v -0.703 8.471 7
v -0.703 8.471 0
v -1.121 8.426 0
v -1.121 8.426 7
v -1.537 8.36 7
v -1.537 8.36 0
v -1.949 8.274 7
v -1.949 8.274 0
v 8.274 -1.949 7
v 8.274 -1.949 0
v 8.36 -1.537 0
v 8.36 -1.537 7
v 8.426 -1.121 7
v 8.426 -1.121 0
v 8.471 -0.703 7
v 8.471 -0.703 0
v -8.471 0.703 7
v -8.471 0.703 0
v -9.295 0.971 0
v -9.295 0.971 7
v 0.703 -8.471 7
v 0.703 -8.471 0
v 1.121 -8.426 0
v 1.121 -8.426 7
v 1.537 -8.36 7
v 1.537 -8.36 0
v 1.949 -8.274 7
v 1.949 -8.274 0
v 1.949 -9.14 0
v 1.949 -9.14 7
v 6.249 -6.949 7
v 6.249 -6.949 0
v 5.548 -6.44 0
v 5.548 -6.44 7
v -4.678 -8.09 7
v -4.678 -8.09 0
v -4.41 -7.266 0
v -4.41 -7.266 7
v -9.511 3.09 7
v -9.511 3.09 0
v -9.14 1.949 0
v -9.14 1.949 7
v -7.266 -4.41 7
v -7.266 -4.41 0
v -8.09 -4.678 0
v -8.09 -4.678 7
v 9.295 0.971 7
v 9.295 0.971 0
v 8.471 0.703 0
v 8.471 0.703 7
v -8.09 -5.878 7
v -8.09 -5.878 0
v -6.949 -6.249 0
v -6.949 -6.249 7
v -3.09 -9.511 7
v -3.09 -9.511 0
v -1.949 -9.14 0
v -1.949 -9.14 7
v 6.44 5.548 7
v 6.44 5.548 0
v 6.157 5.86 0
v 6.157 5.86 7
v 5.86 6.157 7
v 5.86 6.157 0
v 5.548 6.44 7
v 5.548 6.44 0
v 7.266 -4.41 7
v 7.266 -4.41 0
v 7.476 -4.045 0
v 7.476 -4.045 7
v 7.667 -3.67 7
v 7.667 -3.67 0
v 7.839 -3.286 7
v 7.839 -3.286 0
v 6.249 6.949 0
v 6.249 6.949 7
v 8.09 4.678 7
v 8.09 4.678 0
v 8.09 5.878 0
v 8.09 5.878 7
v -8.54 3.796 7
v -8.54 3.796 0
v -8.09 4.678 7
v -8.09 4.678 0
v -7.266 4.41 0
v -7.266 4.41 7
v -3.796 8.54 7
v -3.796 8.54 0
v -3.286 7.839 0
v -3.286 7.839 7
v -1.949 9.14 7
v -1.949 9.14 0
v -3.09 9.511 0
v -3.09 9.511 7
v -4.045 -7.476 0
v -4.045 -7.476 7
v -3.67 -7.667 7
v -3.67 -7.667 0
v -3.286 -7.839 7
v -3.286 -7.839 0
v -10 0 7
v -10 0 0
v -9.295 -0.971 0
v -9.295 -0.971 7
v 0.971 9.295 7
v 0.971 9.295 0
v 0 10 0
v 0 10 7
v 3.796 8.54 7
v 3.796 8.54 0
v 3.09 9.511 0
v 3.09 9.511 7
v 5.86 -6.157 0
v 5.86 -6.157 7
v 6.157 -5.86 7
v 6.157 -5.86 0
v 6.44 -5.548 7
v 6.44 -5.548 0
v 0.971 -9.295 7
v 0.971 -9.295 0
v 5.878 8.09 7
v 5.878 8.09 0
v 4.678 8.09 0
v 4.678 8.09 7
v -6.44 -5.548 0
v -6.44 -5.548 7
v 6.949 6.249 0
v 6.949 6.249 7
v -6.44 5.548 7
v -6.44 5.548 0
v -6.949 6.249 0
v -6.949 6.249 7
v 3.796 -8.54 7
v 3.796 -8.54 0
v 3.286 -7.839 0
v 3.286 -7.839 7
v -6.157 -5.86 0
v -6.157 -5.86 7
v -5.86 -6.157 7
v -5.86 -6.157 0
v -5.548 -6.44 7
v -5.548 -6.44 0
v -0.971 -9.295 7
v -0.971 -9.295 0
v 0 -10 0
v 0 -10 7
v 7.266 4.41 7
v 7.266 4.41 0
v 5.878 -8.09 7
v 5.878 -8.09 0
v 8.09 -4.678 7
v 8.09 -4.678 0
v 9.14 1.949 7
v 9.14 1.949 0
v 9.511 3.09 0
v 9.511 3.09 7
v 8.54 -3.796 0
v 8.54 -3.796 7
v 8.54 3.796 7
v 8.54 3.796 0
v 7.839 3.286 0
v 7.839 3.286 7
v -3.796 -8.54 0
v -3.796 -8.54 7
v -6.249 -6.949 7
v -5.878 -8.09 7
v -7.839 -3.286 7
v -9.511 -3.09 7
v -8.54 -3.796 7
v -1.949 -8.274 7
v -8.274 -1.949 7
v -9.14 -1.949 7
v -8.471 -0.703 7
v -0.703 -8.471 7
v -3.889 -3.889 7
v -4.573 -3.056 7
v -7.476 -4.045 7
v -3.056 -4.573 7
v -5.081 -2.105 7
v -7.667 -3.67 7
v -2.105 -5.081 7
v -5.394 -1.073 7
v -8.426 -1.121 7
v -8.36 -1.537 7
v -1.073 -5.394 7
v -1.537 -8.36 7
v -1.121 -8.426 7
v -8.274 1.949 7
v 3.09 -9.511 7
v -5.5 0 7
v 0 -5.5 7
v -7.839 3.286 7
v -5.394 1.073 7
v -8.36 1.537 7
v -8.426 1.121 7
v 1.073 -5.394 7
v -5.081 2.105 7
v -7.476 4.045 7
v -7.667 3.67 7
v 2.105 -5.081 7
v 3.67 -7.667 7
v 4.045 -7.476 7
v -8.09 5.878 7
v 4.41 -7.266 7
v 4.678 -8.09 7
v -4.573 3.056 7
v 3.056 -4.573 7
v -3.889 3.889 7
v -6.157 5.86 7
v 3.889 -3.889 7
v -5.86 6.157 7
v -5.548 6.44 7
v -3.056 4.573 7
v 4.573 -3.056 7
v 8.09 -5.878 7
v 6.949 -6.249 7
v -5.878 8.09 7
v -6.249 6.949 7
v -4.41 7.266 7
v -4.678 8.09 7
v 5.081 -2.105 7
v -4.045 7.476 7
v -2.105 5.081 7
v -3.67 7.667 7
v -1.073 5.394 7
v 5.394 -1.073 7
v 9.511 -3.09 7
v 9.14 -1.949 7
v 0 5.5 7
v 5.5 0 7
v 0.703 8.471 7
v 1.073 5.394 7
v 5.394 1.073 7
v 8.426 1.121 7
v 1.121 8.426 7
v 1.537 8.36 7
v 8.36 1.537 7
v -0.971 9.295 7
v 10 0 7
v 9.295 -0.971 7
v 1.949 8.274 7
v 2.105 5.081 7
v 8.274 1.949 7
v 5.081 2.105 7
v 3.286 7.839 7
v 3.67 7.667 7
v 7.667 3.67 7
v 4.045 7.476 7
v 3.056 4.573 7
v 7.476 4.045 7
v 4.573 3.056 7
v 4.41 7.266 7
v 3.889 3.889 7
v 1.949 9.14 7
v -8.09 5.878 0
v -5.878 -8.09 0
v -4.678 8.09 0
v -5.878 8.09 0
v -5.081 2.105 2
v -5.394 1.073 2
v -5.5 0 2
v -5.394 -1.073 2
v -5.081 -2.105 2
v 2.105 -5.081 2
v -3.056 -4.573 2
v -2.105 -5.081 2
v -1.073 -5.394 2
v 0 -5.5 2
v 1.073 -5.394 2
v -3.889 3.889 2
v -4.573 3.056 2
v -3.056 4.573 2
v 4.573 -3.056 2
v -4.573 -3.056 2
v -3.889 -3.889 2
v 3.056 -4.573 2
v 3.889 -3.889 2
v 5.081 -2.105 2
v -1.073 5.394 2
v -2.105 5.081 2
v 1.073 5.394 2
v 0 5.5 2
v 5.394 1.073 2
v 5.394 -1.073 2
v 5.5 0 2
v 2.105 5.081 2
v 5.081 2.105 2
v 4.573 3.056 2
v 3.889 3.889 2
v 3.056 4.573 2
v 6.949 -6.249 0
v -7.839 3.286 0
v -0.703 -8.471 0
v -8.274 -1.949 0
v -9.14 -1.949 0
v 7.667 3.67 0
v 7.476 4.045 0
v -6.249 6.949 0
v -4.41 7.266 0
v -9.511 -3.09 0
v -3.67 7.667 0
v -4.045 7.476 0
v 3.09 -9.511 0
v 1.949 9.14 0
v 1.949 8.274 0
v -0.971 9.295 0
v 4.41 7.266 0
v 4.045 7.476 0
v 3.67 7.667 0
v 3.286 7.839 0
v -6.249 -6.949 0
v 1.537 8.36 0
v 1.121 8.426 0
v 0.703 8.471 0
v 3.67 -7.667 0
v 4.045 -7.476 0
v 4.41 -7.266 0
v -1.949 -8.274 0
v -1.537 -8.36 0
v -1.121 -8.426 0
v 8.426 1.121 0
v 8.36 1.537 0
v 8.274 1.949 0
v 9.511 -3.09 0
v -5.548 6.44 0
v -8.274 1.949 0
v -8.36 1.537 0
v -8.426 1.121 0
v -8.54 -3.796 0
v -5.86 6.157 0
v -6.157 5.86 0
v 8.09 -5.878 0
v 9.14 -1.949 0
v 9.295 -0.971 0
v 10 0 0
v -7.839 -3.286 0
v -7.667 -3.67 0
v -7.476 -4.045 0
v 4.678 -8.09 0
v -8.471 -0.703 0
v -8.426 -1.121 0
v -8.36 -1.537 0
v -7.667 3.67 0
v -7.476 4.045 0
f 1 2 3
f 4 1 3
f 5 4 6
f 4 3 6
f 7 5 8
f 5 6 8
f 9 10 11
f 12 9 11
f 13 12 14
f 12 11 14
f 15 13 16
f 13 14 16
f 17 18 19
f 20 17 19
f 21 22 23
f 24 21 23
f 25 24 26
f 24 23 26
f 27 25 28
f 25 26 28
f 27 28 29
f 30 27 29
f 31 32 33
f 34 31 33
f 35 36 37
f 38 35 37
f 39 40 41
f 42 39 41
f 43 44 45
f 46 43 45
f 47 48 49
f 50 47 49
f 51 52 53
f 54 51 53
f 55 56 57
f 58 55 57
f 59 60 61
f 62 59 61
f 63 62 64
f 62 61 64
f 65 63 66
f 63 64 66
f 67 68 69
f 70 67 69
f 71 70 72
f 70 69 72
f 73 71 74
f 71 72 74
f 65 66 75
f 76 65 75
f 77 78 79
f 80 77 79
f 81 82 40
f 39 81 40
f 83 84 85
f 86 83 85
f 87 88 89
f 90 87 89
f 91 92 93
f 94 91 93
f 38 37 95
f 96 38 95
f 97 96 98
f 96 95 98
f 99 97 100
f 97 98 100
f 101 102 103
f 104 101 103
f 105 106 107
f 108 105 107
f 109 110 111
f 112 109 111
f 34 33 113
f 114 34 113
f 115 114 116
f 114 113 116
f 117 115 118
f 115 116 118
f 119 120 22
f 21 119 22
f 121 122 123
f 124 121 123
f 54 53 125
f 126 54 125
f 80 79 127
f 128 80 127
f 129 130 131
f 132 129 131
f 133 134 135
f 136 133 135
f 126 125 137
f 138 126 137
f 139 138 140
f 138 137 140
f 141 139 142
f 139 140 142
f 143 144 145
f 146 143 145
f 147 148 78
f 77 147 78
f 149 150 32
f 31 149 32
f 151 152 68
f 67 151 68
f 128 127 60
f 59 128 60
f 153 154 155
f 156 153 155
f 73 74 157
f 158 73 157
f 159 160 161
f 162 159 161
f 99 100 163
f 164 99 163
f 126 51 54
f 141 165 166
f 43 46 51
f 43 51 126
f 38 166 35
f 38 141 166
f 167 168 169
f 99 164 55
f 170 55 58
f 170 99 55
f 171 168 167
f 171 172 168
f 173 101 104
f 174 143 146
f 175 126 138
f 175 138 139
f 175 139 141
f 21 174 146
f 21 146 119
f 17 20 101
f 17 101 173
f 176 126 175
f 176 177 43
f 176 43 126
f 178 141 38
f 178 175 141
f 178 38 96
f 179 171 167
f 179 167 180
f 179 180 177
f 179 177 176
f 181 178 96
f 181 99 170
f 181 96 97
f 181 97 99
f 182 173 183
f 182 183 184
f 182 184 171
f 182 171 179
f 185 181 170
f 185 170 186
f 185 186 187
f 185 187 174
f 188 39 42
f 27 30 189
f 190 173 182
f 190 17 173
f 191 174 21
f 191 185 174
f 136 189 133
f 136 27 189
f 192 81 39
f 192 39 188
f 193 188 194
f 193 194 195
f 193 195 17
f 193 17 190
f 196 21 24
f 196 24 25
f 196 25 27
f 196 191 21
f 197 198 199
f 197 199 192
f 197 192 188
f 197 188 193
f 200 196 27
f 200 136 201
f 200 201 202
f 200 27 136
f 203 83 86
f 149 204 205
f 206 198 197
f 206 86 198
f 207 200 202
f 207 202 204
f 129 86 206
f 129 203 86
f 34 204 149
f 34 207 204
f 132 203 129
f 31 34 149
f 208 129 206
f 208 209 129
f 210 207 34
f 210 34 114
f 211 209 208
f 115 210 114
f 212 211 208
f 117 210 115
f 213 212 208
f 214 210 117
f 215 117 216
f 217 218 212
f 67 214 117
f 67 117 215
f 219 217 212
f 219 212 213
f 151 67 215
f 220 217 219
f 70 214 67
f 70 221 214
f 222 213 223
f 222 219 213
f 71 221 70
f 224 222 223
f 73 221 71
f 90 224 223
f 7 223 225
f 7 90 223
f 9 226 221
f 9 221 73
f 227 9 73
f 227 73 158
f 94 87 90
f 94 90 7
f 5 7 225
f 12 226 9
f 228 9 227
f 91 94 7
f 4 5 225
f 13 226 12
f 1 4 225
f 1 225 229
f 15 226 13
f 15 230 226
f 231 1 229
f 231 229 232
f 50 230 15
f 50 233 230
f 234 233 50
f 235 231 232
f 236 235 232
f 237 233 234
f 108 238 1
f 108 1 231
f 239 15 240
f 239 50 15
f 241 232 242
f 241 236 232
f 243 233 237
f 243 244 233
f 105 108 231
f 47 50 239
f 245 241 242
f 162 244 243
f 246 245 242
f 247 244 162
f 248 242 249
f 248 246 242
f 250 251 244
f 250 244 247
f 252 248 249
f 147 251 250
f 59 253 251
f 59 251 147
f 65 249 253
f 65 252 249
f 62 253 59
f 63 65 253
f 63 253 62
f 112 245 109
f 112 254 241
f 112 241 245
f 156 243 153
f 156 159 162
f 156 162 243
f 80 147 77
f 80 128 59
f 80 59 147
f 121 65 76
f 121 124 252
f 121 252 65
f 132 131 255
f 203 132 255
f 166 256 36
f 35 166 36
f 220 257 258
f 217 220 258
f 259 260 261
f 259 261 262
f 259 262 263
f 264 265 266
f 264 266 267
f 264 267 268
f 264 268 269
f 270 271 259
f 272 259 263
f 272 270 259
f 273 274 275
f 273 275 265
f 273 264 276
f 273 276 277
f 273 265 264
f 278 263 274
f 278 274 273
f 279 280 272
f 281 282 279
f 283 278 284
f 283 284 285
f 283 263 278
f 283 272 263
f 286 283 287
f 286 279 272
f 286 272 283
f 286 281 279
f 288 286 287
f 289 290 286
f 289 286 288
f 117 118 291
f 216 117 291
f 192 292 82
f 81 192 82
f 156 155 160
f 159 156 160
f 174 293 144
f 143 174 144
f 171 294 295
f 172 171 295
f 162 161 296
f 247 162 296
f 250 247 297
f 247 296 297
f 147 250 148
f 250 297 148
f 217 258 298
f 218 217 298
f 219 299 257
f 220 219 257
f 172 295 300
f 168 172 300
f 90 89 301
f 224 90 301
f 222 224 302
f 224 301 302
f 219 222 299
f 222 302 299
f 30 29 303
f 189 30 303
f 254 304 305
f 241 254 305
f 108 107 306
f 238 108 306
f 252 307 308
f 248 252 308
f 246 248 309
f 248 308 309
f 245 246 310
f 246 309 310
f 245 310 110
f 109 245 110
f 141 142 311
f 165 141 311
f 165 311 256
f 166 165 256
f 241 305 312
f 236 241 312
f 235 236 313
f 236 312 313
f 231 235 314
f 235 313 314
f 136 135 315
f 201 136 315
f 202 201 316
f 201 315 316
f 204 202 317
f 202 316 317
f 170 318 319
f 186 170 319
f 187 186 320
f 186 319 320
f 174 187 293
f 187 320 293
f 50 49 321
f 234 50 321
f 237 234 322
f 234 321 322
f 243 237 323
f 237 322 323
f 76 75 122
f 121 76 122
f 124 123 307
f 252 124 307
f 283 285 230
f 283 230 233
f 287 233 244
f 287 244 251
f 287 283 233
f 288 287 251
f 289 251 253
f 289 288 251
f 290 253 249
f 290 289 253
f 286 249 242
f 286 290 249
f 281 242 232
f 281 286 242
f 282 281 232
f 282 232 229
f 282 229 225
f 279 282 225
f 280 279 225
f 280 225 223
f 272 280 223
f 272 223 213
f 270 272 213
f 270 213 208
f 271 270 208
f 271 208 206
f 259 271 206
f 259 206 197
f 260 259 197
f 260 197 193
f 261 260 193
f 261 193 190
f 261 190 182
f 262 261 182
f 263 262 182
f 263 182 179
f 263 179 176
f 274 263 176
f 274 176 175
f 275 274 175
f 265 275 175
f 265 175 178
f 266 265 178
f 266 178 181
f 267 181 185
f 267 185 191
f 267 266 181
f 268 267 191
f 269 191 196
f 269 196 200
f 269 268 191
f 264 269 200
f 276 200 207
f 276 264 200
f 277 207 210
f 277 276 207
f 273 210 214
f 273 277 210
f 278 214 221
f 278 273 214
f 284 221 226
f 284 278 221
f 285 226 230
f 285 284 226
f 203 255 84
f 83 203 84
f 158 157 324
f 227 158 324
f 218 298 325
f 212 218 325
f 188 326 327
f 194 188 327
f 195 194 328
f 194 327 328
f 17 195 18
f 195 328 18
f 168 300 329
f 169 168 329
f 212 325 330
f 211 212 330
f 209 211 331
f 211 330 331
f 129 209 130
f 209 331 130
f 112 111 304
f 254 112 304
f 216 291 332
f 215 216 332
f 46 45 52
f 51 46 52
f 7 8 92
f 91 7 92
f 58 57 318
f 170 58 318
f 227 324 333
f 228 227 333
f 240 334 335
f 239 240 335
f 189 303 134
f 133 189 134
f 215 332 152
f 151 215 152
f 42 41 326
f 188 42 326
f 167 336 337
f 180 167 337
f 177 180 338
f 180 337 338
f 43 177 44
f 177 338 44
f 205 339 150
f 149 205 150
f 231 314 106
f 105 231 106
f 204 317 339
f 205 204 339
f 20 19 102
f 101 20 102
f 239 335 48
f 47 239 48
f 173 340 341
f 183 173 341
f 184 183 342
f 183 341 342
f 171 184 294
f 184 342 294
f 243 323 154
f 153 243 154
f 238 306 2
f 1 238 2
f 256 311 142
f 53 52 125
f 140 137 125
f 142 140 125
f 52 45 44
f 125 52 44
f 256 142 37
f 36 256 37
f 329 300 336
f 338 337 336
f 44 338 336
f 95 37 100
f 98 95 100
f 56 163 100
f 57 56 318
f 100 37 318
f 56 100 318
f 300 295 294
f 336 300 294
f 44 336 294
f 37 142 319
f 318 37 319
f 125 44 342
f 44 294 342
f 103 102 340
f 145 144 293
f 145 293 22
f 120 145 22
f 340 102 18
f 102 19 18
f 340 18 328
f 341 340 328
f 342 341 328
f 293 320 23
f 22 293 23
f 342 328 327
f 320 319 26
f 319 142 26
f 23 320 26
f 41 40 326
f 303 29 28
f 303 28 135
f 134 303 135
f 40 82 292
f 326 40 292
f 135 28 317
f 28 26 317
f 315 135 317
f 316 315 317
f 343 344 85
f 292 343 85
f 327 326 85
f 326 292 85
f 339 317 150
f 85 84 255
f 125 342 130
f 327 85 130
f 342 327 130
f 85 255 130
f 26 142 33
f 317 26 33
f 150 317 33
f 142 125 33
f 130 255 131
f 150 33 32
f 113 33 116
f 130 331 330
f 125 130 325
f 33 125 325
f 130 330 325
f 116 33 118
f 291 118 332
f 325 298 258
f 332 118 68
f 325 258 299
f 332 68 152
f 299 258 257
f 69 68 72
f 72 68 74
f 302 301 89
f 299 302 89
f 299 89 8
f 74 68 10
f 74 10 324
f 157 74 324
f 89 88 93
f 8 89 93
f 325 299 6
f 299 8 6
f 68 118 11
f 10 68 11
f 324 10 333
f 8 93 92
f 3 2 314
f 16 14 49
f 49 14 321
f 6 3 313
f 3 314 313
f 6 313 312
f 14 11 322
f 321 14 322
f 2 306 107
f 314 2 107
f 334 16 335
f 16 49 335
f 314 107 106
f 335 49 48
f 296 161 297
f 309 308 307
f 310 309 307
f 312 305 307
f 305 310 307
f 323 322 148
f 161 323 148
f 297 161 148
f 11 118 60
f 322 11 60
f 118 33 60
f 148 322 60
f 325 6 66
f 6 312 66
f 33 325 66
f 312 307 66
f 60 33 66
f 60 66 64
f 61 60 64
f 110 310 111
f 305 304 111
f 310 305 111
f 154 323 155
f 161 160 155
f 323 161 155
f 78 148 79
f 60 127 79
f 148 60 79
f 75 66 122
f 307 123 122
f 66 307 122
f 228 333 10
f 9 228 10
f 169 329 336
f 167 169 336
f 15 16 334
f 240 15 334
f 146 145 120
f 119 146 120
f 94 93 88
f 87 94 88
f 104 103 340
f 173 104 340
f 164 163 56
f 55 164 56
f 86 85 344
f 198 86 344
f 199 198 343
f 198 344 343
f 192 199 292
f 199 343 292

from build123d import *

# Parameters (mm, degrees)
BOSS_EXTRUDE1_OUTLINE_R = 5.5
BOSS_EXTRUDE1_DEPTH     = 7
SKETCH1_3_R             = 5.5
BOSS_EXTRUDE2_DEPTH     = 2


# Read off the part's stored shape, not the designer's step: Boss-Extrude1
with BuildPart() as part:
    # Boss-Extrude1 outline → Boss-Extrude1 (new body)
    with BuildSketch(Plane.XY):
        with BuildLine():
            Line((-0.970820393, 9.294657697), (-0.703154307, 8.470866191))
            ThreePointArc((-0.703154307, 8.470866191), (-1.329692953, 8.395350895), (-1.948902124, 8.27355912))
            Line((-1.948902124, 8.27355912), (-1.948902124, 9.13974477))
            Line((-1.948902124, 9.13974477), (-3.090169944, 9.510565163))
            Line((-3.090169944, 9.510565163), (-3.795512247, 8.53974477))
            Line((-3.795512247, 8.53974477), (-3.286381096, 7.838985859))
            ThreePointArc((-3.286381096, 7.838985859), (-3.858919248, 7.573555456), (-4.410186437, 7.266378437))
            Line((-4.410186437, 7.266378437), (-4.677852523, 8.090169944))
            Line((-4.677852523, 8.090169944), (-5.877852523, 8.090169944))
            Line((-5.877852523, 8.090169944), (-6.248672916, 6.948902124))
            Line((-6.248672916, 6.948902124), (-5.547914005, 6.439770973))
            ThreePointArc((-5.547914005, 6.439770973), (-6.01040764, 6.01040764), (-6.439770973, 5.547914005))
            Line((-6.439770973, 5.547914005), (-6.948902124, 6.248672916))
            Line((-6.948902124, 6.248672916), (-8.090169944, 5.877852523))
            Line((-8.090169944, 5.877852523), (-8.090169944, 4.677852523))
            Line((-8.090169944, 4.677852523), (-7.266378437, 4.410186437))
            ThreePointArc((-7.266378437, 4.410186437), (-7.573555456, 3.858919248), (-7.838985859, 3.286381096))
            Line((-7.838985859, 3.286381096), (-8.53974477, 3.795512246))
            Line((-8.53974477, 3.795512246), (-9.510565163, 3.090169944))
            Line((-9.510565163, 3.090169944), (-9.13974477, 1.948902124))
            Line((-9.13974477, 1.948902124), (-8.27355912, 1.948902124))
            ThreePointArc((-8.27355912, 1.948902124), (-8.395350895, 1.329692953), (-8.470866191, 0.703154307))
            Line((-8.470866191, 0.703154307), (-9.294657697, 0.970820393))
            Line((-9.294657697, 0.970820393), (-10, 0))
            Line((-10, 0), (-9.294657697, -0.970820393))
            Line((-9.294657697, -0.970820393), (-8.470866191, -0.703154307))
            ThreePointArc((-8.470866191, -0.703154307), (-8.395350895, -1.329692953), (-8.27355912, -1.948902124))
            Line((-8.27355912, -1.948902124), (-9.13974477, -1.948902124))
            Line((-9.13974477, -1.948902124), (-9.510565163, -3.090169944))
            Line((-9.510565163, -3.090169944), (-8.53974477, -3.795512247))
            Line((-8.53974477, -3.795512247), (-7.838985859, -3.286381096))
            ThreePointArc((-7.838985859, -3.286381096), (-7.573555456, -3.858919248), (-7.266378437, -4.410186437))
            Line((-7.266378437, -4.410186437), (-8.090169944, -4.677852523))
            Line((-8.090169944, -4.677852523), (-8.090169944, -5.877852523))
            Line((-8.090169944, -5.877852523), (-6.948902124, -6.248672916))
            Line((-6.948902124, -6.248672916), (-6.439770973, -5.547914005))
            ThreePointArc((-6.439770973, -5.547914005), (-6.01040764, -6.01040764), (-5.547914005, -6.439770973))
            Line((-5.547914005, -6.439770973), (-6.248672916, -6.948902124))
            Line((-6.248672916, -6.948902124), (-5.877852523, -8.090169944))
            Line((-5.877852523, -8.090169944), (-4.677852523, -8.090169944))
            Line((-4.677852523, -8.090169944), (-4.410186437, -7.266378437))
            ThreePointArc((-4.410186437, -7.266378437), (-3.858919248, -7.573555456), (-3.286381096, -7.838985859))
            Line((-3.286381096, -7.838985859), (-3.795512246, -8.53974477))
            Line((-3.795512246, -8.53974477), (-3.090169944, -9.510565163))
            Line((-3.090169944, -9.510565163), (-1.948902124, -9.13974477))
            Line((-1.948902124, -9.13974477), (-1.948902124, -8.27355912))
            ThreePointArc((-1.948902124, -8.27355912), (-1.329692953, -8.395350895), (-0.703154307, -8.470866191))
            Line((-0.703154307, -8.470866191), (-0.970820393, -9.294657697))
            Line((-0.970820393, -9.294657697), (0, -10))
            Line((0, -10), (0.970820393, -9.294657697))
            Line((0.970820393, -9.294657697), (0.703154307, -8.470866191))
            ThreePointArc((0.703154307, -8.470866191), (1.329692953, -8.395350895), (1.948902124, -8.27355912))
            Line((1.948902124, -8.27355912), (1.948902124, -9.13974477))
            Line((1.948902124, -9.13974477), (3.090169944, -9.510565163))
            Line((3.090169944, -9.510565163), (3.795512247, -8.53974477))
            Line((3.795512247, -8.53974477), (3.286381096, -7.838985859))
            ThreePointArc((3.286381096, -7.838985859), (3.858919248, -7.573555456), (4.410186437, -7.266378437))
            Line((4.410186437, -7.266378437), (4.677852523, -8.090169944))
            Line((4.677852523, -8.090169944), (5.877852523, -8.090169944))
            Line((5.877852523, -8.090169944), (6.248672916, -6.948902124))
            Line((6.248672916, -6.948902124), (5.547914005, -6.439770973))
            ThreePointArc((5.547914005, -6.439770973), (6.01040764, -6.01040764), (6.439770973, -5.547914005))
            Line((6.439770973, -5.547914005), (6.948902124, -6.248672916))
            Line((6.948902124, -6.248672916), (8.090169944, -5.877852523))
            Line((8.090169944, -5.877852523), (8.090169944, -4.677852523))
            Line((8.090169944, -4.677852523), (7.266378437, -4.410186437))
            ThreePointArc((7.266378437, -4.410186437), (7.573555456, -3.858919248), (7.838985859, -3.286381096))
            Line((7.838985859, -3.286381096), (8.53974477, -3.795512246))
            Line((8.53974477, -3.795512246), (9.510565163, -3.090169944))
            Line((9.510565163, -3.090169944), (9.13974477, -1.948902124))
            Line((9.13974477, -1.948902124), (8.27355912, -1.948902124))
            ThreePointArc((8.27355912, -1.948902124), (8.395350895, -1.329692953), (8.470866191, -0.703154307))
            Line((8.470866191, -0.703154307), (9.294657697, -0.970820393))
            Line((9.294657697, -0.970820393), (10, 0))
            Line((10, 0), (9.294657697, 0.970820393))
            Line((9.294657697, 0.970820393), (8.470866191, 0.703154307))
            ThreePointArc((8.470866191, 0.703154307), (8.395350895, 1.329692953), (8.27355912, 1.948902124))
            Line((8.27355912, 1.948902124), (9.13974477, 1.948902124))
            Line((9.13974477, 1.948902124), (9.510565163, 3.090169944))
            Line((9.510565163, 3.090169944), (8.53974477, 3.795512247))
            Line((8.53974477, 3.795512247), (7.838985859, 3.286381096))
            ThreePointArc((7.838985859, 3.286381096), (7.573555456, 3.858919248), (7.266378437, 4.410186437))
            Line((7.266378437, 4.410186437), (8.090169944, 4.677852523))
            Line((8.090169944, 4.677852523), (8.090169944, 5.877852523))
            Line((8.090169944, 5.877852523), (6.948902124, 6.248672916))
            Line((6.948902124, 6.248672916), (6.439770973, 5.547914005))
            ThreePointArc((6.439770973, 5.547914005), (6.01040764, 6.01040764), (5.547914005, 6.439770973))
            Line((5.547914005, 6.439770973), (6.248672916, 6.948902124))
            Line((6.248672916, 6.948902124), (5.877852523, 8.090169944))
            Line((5.877852523, 8.090169944), (4.677852523, 8.090169944))
            Line((4.677852523, 8.090169944), (4.410186437, 7.266378437))
            ThreePointArc((4.410186437, 7.266378437), (3.858919248, 7.573555456), (3.286381096, 7.838985859))
            Line((3.286381096, 7.838985859), (3.795512247, 8.53974477))
            Line((3.795512247, 8.53974477), (3.090169944, 9.510565163))
            Line((3.090169944, 9.510565163), (1.948902124, 9.13974477))
            Line((1.948902124, 9.13974477), (1.948902124, 8.27355912))
            ThreePointArc((1.948902124, 8.27355912), (1.329692953, 8.395350895), (0.703154307, 8.470866191))
            Line((0.703154307, 8.470866191), (0.970820393, 9.294657697))
            Line((0.970820393, 9.294657697), (0, 10))
            Line((0, 10), (-0.970820393, 9.294657697))
        make_face()
        Circle(BOSS_EXTRUDE1_OUTLINE_R, mode=Mode.SUBTRACT)
    extrude(amount=BOSS_EXTRUDE1_DEPTH)

    # Sketch1<3> → Boss-Extrude2 (add)
    with BuildSketch(Plane.XY):
        Circle(SKETCH1_3_R)
    extrude(amount=BOSS_EXTRUDE2_DEPTH)


solid = part.part
